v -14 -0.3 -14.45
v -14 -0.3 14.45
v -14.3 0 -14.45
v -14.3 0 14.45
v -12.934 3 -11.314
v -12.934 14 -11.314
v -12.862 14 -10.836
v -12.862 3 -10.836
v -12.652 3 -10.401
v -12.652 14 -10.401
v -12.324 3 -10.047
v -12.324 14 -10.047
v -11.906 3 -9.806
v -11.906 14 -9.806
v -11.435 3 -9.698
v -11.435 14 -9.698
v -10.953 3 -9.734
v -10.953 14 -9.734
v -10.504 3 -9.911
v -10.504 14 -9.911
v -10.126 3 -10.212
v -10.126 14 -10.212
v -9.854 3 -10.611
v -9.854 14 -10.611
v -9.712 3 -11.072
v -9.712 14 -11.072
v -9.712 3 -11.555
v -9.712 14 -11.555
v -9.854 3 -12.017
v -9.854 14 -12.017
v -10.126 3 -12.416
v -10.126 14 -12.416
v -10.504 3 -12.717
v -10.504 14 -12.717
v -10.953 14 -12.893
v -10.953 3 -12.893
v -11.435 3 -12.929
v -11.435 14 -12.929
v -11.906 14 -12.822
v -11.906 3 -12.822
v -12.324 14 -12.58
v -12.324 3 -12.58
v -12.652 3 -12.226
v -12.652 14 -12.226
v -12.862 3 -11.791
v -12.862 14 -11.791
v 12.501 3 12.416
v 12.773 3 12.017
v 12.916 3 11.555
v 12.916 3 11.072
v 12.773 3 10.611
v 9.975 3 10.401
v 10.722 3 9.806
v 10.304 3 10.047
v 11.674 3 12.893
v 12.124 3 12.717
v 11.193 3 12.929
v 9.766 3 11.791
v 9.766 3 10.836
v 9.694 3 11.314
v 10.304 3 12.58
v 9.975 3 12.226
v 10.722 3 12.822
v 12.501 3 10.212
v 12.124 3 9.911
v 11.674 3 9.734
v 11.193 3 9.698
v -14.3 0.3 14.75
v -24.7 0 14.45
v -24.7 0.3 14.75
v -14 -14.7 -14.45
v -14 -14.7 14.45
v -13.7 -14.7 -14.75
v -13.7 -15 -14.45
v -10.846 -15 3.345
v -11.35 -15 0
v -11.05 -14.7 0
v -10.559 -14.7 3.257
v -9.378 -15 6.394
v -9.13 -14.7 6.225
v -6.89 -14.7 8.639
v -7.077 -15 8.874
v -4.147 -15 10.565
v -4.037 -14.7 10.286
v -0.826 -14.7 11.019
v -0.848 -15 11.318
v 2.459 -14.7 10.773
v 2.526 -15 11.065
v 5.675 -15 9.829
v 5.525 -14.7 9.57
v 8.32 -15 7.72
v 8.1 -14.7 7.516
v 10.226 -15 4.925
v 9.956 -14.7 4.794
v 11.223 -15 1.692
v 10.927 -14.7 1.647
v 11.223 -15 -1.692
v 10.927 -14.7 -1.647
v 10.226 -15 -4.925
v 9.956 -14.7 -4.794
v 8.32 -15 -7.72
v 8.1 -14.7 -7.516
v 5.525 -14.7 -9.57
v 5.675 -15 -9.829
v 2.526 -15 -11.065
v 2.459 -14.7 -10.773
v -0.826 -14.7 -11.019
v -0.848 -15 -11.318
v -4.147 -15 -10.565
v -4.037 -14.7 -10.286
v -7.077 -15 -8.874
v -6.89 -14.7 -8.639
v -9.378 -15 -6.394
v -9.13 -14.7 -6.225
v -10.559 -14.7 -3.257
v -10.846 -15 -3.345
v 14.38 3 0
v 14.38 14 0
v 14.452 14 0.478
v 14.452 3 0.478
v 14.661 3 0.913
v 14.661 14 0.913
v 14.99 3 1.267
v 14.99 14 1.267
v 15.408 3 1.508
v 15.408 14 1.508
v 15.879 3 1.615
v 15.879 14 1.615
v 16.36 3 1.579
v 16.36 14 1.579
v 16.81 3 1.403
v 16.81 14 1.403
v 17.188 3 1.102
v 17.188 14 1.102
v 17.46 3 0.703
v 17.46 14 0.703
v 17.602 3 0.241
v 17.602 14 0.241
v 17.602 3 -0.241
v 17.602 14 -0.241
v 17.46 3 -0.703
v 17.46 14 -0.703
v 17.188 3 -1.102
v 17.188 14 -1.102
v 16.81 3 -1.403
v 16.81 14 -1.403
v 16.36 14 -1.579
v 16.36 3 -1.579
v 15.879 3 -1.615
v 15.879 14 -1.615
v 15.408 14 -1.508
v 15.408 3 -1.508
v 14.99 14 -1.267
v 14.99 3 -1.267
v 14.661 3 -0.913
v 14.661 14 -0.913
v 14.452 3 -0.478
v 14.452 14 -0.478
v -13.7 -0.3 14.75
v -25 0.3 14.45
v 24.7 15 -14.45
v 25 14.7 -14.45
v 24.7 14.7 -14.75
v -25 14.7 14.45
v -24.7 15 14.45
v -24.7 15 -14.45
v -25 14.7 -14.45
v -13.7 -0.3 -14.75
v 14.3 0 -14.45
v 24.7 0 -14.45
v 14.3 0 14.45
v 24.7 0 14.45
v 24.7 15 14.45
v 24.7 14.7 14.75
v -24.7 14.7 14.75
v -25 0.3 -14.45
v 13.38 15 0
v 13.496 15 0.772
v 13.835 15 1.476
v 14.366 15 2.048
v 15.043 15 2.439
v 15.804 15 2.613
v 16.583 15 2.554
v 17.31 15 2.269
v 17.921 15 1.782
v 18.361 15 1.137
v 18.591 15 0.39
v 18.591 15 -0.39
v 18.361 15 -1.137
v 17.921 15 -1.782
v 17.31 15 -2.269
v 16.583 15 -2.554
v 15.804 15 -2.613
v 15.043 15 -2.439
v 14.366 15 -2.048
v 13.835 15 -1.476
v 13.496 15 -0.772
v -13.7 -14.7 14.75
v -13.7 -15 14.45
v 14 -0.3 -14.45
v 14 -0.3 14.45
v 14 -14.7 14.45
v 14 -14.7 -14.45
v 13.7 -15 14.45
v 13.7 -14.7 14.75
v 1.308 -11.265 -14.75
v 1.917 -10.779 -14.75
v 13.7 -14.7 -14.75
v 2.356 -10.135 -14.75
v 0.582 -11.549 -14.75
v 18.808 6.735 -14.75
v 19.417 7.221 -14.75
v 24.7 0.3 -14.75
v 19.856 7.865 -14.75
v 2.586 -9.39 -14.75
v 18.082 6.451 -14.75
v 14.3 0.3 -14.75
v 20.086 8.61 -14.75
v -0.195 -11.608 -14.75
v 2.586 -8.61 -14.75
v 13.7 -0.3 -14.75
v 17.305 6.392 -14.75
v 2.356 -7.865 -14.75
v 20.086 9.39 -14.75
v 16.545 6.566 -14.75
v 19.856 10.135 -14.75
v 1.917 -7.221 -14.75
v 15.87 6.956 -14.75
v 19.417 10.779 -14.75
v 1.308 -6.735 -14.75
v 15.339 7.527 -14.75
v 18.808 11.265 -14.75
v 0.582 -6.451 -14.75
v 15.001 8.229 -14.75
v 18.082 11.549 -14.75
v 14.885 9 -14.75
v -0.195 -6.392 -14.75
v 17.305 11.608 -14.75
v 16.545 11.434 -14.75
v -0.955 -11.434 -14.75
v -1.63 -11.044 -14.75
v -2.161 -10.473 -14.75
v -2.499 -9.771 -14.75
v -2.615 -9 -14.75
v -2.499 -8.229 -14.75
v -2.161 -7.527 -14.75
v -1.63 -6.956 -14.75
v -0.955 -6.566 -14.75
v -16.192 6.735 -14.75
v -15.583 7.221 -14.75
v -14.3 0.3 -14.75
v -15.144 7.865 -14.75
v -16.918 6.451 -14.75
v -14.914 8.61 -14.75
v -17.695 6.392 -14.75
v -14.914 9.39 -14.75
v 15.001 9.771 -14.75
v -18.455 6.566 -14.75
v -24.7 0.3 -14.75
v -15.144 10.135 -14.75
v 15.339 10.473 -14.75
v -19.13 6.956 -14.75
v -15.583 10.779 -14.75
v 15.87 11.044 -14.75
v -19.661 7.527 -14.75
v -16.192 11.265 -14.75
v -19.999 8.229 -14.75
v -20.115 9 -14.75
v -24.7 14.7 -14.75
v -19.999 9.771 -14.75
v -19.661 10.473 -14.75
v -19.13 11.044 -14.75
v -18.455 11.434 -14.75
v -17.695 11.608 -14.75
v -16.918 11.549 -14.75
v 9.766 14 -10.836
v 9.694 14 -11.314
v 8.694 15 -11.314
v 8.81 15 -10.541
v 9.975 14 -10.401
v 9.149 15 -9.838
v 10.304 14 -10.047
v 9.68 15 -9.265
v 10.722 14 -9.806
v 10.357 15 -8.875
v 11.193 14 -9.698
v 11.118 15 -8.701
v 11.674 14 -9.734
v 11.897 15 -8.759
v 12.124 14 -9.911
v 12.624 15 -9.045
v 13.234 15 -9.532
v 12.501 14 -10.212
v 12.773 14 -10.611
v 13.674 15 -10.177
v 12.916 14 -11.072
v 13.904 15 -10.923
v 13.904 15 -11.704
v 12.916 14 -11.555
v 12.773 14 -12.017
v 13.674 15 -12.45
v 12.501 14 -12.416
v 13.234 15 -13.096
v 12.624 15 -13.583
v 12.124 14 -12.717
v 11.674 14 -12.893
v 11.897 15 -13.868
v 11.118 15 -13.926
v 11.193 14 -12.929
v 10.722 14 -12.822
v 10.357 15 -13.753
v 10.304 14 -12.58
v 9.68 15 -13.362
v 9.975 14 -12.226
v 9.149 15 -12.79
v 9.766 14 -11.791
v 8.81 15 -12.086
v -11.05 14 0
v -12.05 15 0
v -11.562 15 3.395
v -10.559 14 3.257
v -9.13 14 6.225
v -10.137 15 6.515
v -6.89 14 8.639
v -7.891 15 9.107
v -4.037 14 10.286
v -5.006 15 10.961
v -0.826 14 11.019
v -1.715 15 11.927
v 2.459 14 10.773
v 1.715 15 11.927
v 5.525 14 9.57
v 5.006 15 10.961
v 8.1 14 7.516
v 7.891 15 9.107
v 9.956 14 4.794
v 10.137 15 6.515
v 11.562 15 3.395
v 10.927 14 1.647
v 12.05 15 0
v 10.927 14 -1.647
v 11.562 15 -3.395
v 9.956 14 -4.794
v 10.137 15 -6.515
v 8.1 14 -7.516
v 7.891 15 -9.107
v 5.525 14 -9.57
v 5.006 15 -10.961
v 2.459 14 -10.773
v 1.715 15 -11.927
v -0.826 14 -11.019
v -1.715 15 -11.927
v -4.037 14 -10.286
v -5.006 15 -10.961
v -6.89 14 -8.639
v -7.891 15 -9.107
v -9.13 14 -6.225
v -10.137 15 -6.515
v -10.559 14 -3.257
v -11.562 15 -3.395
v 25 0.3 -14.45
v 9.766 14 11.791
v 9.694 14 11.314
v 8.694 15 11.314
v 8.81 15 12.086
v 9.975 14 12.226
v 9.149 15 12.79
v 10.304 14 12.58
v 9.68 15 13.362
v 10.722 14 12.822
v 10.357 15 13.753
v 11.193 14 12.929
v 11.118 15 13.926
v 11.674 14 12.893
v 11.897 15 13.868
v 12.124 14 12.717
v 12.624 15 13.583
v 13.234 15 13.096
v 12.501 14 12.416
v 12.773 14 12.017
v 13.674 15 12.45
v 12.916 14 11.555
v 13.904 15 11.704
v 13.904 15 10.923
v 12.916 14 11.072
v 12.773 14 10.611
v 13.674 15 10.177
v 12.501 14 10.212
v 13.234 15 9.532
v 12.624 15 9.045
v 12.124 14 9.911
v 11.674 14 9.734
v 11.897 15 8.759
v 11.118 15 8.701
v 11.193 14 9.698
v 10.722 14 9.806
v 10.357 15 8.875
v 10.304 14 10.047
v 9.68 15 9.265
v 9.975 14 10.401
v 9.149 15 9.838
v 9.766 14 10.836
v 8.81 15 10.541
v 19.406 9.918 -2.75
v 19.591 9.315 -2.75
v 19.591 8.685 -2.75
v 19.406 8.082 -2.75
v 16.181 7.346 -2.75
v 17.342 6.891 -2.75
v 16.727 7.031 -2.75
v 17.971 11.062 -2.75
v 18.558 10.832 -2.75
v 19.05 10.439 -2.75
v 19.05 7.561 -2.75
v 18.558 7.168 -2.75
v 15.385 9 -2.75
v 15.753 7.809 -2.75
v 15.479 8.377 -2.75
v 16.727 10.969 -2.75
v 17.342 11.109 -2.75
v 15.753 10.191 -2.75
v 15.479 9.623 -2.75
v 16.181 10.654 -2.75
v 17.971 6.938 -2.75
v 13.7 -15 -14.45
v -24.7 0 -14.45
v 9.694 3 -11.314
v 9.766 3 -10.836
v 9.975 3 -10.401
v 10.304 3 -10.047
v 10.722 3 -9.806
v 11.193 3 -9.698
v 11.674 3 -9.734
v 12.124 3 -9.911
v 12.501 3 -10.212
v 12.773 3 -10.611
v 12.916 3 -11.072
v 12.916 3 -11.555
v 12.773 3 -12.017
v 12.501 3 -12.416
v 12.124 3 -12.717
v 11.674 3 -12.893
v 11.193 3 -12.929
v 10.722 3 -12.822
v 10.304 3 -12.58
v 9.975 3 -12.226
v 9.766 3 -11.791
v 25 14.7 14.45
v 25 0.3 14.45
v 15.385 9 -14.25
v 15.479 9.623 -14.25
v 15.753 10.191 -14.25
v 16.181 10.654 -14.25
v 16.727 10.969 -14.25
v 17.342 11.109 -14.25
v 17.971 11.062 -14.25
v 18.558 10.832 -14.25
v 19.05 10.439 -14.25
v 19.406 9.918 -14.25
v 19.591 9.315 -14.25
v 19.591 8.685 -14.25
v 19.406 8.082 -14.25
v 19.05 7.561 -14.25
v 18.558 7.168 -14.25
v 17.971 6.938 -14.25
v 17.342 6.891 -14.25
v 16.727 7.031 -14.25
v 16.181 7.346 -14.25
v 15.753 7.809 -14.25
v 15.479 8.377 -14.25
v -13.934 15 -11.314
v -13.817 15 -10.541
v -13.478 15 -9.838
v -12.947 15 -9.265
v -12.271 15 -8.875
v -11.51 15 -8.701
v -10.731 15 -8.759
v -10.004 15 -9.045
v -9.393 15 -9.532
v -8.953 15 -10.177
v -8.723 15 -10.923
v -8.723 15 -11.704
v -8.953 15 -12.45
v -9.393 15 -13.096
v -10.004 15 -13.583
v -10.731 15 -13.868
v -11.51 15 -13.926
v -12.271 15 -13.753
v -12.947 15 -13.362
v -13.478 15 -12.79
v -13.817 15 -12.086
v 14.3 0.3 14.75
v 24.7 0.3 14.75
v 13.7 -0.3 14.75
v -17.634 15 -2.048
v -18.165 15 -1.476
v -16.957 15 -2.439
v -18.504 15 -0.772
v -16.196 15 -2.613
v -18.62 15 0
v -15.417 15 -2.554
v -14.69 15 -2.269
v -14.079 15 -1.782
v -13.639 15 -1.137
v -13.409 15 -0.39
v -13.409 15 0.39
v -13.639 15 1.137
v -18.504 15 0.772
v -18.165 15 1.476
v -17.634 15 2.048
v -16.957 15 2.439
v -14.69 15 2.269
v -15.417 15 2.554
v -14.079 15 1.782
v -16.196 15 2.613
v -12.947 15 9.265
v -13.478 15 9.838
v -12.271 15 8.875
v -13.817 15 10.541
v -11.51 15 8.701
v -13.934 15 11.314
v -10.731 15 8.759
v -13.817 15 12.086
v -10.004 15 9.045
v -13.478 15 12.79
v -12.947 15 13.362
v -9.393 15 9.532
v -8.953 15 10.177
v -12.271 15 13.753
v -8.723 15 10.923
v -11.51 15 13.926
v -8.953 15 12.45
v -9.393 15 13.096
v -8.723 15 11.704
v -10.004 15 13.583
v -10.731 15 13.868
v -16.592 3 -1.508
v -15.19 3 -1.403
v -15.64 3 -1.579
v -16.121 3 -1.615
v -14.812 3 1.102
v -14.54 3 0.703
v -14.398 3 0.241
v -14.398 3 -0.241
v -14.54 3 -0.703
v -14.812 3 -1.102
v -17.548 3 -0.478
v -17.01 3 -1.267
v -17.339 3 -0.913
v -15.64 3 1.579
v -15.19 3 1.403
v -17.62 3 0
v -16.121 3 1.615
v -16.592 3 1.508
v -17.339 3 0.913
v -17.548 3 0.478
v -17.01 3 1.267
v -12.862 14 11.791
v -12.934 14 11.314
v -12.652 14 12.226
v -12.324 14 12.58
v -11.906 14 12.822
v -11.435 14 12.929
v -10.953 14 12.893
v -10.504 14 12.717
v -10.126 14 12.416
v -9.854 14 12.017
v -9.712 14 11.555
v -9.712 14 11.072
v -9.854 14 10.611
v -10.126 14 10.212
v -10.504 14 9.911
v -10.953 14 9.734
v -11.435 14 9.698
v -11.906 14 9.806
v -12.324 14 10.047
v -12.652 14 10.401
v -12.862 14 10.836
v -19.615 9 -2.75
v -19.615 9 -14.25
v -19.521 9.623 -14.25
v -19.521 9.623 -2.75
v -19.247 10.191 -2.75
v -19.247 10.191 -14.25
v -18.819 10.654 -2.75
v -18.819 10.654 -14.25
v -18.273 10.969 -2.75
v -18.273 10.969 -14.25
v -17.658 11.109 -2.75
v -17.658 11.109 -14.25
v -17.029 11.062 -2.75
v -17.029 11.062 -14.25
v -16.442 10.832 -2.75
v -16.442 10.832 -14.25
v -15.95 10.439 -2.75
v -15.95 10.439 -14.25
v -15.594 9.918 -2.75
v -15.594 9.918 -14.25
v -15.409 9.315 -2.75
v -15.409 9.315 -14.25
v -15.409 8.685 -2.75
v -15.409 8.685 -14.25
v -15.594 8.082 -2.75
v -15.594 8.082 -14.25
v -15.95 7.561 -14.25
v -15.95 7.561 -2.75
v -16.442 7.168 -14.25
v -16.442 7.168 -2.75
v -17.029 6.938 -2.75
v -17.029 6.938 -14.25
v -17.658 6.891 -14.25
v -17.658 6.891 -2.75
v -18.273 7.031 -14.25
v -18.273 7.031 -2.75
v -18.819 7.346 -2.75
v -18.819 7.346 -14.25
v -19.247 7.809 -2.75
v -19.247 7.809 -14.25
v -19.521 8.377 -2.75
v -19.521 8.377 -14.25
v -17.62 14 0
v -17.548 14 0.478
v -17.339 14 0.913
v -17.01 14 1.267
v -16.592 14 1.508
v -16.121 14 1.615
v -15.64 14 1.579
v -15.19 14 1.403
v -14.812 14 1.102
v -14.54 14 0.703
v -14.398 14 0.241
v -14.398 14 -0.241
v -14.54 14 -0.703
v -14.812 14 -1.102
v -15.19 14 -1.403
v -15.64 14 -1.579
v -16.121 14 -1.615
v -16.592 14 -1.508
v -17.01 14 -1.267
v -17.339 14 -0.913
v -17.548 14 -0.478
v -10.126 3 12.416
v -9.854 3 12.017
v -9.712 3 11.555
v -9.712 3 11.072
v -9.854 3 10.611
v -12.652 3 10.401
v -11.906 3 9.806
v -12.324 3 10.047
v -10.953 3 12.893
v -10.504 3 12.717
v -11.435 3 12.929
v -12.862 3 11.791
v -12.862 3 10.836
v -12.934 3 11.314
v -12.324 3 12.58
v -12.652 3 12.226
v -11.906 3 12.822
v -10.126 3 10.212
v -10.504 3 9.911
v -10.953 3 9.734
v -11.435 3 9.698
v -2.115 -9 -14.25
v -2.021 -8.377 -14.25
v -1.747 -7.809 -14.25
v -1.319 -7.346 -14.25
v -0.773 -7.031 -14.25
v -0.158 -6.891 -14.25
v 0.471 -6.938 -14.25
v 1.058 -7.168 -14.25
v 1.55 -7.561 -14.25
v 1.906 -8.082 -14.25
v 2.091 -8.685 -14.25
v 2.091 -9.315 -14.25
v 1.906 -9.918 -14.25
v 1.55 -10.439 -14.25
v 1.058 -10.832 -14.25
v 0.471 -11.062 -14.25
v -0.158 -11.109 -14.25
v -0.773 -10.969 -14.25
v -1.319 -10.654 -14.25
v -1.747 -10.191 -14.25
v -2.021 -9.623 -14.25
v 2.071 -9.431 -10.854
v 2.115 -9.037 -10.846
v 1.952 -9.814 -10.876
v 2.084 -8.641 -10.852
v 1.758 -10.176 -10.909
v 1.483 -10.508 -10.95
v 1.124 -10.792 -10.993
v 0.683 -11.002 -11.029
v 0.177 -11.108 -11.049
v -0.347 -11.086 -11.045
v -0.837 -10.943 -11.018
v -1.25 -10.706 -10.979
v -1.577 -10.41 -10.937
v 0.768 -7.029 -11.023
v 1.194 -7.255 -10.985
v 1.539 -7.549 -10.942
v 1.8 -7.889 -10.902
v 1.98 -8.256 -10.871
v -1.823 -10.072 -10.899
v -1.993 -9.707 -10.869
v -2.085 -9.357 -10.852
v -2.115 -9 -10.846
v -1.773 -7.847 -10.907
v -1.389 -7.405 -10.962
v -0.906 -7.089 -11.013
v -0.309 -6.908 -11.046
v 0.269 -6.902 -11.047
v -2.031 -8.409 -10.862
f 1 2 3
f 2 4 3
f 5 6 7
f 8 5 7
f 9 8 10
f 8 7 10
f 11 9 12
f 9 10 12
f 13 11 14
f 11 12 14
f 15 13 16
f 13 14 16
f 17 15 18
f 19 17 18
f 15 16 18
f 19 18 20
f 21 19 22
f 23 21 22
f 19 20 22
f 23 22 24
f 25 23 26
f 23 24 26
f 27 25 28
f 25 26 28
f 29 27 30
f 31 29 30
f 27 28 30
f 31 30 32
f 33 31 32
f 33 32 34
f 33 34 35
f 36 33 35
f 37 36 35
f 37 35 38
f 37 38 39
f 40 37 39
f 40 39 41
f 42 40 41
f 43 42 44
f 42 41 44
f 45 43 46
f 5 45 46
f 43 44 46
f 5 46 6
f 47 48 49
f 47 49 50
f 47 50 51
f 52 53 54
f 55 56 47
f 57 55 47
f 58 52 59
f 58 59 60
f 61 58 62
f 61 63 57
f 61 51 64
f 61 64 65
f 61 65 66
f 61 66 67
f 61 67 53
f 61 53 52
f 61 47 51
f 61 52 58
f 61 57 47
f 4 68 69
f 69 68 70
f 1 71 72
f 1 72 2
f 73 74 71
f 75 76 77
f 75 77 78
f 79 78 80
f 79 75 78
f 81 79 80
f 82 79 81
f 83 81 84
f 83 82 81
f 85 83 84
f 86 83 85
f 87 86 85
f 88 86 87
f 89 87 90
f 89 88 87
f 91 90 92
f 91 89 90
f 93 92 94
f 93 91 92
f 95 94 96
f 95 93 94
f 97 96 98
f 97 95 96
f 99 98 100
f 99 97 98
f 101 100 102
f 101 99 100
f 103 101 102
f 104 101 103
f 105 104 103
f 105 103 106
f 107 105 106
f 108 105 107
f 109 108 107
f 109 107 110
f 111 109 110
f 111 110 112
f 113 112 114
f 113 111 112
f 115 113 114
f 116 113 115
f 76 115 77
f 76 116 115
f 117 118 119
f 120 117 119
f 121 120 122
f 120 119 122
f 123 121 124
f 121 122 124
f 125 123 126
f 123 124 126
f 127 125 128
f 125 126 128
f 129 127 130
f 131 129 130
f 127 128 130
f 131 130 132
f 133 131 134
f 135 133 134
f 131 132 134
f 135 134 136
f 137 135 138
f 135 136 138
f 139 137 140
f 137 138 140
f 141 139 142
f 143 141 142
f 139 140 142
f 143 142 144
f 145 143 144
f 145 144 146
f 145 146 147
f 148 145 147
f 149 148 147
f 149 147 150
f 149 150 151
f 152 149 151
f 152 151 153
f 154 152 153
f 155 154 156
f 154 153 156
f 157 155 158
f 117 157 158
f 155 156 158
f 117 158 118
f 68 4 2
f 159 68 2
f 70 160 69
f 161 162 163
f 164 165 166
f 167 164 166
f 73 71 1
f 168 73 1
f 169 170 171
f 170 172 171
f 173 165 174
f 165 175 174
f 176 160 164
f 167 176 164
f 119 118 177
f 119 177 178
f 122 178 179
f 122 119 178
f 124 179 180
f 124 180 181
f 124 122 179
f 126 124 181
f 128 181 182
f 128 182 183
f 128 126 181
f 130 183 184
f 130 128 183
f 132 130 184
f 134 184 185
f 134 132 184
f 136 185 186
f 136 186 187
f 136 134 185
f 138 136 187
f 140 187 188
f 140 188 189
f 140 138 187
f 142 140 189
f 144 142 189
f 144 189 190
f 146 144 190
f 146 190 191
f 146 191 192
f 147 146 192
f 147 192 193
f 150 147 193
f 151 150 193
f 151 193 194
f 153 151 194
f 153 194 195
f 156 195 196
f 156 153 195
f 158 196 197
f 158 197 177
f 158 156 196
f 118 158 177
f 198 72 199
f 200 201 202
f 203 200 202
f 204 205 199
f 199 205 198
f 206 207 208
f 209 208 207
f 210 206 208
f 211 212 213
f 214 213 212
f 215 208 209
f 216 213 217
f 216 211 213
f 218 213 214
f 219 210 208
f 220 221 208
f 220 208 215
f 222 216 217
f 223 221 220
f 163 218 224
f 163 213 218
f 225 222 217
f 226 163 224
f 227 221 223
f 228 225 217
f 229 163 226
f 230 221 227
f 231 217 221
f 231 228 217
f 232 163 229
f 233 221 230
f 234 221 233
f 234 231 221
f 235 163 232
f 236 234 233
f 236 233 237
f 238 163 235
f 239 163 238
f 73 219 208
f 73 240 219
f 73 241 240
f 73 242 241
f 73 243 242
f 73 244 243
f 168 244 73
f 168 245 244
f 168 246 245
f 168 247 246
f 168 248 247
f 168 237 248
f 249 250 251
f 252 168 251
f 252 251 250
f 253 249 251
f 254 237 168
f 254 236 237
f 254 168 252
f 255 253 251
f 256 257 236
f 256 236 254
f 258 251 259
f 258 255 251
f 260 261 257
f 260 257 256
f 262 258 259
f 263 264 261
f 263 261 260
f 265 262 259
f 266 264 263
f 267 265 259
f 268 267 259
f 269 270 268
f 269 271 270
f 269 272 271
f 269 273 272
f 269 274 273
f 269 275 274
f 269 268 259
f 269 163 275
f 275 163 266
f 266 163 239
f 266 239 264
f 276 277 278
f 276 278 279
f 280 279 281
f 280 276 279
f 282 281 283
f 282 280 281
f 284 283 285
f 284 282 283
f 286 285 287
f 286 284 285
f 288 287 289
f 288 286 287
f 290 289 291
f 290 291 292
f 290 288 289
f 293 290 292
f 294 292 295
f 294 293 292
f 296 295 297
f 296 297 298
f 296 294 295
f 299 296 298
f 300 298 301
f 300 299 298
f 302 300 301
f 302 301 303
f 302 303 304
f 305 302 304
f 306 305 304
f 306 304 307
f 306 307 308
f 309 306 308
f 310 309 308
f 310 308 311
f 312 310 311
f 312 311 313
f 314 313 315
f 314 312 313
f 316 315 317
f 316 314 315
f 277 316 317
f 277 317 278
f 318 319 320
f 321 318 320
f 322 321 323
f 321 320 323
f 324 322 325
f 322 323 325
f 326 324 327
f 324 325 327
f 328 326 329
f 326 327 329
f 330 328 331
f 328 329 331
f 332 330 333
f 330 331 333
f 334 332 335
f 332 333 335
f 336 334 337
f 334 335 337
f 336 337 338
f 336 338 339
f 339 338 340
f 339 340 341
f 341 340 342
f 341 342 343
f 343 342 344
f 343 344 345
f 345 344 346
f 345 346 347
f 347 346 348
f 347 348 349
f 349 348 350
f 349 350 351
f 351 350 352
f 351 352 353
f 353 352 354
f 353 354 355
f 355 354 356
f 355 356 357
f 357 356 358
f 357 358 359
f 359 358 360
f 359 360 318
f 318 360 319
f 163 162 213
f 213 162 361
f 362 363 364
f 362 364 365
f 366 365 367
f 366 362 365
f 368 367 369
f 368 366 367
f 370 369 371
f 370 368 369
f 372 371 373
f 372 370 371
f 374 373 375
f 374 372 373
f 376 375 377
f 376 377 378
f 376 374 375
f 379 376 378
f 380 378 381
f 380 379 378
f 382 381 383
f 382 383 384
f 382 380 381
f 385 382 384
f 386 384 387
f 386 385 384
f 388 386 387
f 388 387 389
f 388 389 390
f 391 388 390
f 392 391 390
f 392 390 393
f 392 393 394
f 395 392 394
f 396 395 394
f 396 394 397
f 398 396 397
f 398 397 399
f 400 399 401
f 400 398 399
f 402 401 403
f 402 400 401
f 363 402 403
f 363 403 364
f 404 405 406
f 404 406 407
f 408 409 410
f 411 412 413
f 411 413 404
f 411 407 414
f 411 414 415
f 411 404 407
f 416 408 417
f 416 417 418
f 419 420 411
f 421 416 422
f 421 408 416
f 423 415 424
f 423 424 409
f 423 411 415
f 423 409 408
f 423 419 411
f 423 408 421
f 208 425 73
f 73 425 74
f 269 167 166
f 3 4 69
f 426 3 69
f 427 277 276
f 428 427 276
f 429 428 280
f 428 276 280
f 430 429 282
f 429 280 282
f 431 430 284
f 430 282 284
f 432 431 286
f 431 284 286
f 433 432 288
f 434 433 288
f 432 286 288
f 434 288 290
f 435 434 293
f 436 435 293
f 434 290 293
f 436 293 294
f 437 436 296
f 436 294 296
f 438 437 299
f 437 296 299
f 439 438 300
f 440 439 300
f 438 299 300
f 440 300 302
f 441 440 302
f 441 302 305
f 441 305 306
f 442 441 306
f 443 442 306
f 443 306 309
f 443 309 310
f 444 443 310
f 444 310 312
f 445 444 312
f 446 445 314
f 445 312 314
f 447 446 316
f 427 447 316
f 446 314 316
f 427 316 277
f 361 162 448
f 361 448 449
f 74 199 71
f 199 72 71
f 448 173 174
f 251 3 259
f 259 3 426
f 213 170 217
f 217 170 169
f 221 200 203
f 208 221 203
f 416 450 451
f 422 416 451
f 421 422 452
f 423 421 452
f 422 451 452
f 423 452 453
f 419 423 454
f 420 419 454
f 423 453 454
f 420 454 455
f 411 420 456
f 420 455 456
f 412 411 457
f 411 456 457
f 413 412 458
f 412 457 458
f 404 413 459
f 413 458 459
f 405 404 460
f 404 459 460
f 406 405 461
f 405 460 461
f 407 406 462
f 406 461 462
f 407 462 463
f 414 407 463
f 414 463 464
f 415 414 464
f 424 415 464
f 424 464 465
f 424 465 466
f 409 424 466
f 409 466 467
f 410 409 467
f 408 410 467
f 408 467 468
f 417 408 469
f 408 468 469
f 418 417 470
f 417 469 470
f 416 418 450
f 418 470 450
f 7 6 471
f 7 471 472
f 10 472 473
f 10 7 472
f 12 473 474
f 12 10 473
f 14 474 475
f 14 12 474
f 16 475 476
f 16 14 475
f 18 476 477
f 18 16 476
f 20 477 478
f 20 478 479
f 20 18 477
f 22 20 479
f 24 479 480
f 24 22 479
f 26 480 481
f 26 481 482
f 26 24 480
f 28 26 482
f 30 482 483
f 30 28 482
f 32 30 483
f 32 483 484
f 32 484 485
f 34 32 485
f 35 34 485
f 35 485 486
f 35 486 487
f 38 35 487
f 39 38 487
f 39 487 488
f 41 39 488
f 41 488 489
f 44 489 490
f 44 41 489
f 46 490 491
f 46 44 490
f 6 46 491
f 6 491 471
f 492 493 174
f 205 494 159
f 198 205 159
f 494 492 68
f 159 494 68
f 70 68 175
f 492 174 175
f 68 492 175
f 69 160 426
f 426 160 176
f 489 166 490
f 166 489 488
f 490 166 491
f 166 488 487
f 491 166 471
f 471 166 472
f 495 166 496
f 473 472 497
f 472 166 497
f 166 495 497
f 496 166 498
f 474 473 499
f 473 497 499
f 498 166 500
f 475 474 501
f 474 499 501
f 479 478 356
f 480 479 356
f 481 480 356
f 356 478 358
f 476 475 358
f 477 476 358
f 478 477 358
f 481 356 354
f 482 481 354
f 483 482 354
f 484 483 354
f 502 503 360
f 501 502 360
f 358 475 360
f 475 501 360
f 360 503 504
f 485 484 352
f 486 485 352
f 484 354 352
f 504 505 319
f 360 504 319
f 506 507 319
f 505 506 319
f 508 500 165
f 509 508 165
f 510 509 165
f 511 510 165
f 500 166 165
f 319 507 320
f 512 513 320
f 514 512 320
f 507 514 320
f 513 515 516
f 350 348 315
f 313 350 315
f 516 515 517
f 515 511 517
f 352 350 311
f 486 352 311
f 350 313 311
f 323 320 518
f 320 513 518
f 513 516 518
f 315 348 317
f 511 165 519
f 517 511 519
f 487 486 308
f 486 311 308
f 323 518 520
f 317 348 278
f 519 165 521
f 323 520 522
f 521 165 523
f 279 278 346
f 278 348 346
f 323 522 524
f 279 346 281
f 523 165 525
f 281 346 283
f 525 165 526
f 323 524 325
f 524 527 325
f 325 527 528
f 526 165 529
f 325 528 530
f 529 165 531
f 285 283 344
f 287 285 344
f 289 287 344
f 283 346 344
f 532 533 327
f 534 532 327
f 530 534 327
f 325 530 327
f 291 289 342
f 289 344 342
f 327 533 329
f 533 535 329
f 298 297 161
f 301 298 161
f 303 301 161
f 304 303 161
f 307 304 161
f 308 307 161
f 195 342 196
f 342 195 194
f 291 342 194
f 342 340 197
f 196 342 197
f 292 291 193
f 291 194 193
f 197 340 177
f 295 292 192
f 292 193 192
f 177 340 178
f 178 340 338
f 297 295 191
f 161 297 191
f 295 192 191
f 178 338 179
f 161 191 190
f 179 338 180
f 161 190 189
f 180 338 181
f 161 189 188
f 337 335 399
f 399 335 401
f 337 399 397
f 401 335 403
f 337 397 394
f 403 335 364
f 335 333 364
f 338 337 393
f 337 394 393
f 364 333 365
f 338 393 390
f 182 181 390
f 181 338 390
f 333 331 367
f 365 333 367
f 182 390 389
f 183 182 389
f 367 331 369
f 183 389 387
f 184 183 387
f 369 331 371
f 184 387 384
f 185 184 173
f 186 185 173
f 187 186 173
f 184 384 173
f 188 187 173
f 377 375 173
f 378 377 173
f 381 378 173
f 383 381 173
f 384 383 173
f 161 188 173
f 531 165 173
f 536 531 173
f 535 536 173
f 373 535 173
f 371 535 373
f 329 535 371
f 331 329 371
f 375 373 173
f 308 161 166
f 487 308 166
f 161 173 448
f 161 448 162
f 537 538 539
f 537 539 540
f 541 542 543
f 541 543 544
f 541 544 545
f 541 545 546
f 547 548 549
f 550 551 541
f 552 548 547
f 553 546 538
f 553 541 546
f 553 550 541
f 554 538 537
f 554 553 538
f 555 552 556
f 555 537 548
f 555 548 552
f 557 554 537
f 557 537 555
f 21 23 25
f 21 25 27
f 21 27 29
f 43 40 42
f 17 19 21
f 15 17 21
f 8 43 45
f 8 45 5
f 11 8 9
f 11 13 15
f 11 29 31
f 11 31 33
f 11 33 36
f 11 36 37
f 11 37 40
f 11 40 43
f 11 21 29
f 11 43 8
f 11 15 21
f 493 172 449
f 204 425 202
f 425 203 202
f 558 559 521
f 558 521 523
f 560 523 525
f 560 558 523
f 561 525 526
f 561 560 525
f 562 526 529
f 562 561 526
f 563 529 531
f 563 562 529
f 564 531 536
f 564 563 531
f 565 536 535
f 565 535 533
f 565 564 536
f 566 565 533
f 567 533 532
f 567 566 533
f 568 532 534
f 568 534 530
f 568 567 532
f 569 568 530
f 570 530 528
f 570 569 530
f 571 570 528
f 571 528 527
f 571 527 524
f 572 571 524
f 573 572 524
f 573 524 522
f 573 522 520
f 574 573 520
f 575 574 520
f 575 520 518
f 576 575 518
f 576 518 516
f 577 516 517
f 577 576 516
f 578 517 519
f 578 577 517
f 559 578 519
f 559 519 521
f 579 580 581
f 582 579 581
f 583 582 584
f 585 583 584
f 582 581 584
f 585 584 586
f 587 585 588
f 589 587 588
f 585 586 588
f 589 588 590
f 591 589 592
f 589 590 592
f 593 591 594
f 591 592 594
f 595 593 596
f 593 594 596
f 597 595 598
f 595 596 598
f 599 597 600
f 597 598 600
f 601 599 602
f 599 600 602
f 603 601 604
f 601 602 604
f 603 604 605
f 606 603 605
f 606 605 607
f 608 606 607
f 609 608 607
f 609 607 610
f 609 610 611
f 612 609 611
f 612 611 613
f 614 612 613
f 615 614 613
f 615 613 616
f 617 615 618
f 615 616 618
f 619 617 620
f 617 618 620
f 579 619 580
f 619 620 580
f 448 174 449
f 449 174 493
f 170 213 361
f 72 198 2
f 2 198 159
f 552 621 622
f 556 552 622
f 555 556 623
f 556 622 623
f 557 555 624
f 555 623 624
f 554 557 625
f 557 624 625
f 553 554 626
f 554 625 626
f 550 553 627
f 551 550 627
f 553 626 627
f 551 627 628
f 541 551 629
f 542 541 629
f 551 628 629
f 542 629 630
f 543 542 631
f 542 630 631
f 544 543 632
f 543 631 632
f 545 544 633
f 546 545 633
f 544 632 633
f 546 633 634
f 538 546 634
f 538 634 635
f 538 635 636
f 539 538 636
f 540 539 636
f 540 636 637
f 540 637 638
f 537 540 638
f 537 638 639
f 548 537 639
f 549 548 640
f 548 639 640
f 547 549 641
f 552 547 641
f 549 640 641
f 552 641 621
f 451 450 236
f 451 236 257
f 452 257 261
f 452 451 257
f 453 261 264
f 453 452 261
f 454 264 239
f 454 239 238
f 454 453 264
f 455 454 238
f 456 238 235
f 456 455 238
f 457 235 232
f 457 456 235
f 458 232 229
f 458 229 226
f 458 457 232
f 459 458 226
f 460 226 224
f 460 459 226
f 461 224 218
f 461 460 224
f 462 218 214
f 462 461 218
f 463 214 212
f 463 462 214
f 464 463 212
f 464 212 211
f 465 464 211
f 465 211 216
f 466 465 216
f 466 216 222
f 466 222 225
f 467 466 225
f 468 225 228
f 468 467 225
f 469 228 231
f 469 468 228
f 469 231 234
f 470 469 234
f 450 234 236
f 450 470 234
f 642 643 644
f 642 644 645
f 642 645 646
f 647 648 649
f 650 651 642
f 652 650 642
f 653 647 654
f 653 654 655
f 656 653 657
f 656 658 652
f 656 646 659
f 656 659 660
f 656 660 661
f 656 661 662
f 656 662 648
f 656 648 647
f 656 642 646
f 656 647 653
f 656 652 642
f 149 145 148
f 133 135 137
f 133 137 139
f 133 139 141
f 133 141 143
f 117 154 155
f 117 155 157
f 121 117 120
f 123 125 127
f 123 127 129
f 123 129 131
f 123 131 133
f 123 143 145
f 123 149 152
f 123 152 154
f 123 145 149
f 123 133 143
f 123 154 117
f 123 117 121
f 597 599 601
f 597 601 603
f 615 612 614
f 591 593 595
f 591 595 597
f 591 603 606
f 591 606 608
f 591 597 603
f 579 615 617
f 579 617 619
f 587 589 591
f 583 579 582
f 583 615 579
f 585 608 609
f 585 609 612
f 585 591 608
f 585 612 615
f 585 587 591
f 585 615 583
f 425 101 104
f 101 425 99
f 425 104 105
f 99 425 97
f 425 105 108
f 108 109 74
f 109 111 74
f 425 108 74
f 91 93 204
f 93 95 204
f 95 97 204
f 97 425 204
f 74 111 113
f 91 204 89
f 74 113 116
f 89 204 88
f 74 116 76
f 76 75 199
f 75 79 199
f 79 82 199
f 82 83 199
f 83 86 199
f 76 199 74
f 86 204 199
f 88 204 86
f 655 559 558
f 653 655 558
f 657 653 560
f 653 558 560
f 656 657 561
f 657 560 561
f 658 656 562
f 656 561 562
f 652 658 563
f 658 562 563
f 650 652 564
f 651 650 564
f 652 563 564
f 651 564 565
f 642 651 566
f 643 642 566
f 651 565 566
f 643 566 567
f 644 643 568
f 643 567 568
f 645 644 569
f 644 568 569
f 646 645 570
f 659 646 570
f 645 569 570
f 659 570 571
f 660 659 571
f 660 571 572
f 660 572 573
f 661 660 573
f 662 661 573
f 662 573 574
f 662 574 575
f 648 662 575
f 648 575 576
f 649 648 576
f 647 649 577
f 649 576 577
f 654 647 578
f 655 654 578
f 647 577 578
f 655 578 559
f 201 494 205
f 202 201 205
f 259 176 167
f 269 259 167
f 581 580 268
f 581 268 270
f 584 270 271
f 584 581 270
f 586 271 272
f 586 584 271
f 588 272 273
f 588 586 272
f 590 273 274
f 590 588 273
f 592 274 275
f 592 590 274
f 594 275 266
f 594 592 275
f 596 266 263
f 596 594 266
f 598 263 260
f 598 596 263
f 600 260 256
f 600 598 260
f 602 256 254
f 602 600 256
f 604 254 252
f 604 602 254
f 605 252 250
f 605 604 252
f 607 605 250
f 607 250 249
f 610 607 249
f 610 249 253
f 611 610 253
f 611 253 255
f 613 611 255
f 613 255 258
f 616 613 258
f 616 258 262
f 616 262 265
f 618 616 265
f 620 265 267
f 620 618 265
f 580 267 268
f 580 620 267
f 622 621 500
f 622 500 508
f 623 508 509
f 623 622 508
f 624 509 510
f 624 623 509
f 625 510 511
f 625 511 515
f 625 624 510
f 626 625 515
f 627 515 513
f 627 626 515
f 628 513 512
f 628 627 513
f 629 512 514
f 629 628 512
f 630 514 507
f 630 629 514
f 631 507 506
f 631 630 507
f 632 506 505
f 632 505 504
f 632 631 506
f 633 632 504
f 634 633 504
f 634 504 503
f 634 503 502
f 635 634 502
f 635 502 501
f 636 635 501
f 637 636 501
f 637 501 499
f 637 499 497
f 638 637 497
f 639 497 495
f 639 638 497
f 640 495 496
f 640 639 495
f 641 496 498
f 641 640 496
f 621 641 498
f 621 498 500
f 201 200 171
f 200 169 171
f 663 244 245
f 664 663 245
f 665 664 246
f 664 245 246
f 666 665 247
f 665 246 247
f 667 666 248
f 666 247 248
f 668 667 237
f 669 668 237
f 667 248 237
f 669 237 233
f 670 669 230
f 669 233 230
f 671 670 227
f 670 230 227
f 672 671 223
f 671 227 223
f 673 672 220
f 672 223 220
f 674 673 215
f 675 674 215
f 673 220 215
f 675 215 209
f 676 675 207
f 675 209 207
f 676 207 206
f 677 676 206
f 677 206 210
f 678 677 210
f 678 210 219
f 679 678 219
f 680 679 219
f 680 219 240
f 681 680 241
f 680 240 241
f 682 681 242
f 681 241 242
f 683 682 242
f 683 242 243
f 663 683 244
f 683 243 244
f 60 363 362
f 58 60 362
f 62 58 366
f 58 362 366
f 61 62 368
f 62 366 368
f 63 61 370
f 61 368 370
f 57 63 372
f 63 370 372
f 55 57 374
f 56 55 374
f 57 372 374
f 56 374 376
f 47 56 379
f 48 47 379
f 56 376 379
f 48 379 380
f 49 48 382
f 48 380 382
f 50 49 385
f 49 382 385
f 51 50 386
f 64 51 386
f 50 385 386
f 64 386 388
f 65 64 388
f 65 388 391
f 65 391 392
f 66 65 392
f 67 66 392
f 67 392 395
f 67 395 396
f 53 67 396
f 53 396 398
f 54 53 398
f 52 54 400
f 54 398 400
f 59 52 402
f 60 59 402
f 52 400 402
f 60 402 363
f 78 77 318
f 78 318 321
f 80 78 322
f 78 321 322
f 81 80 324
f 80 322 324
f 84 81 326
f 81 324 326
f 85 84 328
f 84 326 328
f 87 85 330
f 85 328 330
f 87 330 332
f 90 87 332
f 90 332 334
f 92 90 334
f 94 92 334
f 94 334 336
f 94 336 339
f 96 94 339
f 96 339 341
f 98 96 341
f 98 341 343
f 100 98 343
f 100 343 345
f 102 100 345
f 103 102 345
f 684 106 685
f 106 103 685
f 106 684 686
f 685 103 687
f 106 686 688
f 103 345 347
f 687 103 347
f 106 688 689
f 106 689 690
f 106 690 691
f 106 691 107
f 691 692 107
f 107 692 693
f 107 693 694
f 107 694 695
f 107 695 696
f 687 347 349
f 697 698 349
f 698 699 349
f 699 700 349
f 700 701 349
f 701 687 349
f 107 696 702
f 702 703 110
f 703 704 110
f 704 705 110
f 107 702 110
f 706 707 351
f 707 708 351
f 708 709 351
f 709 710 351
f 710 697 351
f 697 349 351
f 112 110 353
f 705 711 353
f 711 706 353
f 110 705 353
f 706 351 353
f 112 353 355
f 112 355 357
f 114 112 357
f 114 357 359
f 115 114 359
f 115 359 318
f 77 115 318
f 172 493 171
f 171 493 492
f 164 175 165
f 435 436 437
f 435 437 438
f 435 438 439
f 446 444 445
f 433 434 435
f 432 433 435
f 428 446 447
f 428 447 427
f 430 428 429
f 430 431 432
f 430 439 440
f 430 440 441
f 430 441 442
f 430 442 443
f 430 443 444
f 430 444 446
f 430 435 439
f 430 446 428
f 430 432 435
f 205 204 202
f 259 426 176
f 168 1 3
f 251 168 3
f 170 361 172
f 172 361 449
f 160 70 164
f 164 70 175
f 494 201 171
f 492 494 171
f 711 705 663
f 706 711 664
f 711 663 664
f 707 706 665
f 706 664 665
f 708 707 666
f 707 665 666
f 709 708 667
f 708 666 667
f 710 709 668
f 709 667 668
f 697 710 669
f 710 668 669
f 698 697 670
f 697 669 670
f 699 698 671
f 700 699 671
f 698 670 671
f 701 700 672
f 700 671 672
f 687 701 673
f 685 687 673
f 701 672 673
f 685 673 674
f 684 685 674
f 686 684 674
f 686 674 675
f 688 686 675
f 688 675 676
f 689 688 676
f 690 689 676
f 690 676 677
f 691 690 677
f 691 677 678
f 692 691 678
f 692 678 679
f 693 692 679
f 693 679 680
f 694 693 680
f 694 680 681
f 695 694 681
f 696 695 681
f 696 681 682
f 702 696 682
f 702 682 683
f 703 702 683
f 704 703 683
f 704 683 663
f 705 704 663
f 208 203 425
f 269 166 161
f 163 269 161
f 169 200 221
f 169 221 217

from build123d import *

# Parameters (mm, degrees)
BOSS_EXTRUDE1_DEPTH = 14.75
SKETCH2_R           = 11.05
CUT_EXTRUDE1_DEPTH  = 42.744011547
SKETCH4_R           = 2.115
CUT_EXTRUDE2_DEPTH  = 12
SKETCH5_R           = 1.62
CUT_EXTRUDE3_DEPTH  = 12
CHAMFER1_SIZE       = 1
CHAMFER2_SIZE       = 0.5
CHAMFER3_SIZE       = 0.3


with BuildPart() as part:
    # Sketch1 → Boss-Extrude1 (new, symmetric)
    with BuildSketch(Plane.XY):
        Polygon((14, -15), (-14, -15), (-14, 0), (-25, 0), (-25, 15), (25, 15), (25, 0), (14, 0), align=None)
    extrude(amount=BOSS_EXTRUDE1_DEPTH, both=True)

    # Sketch2 → Cut-Extrude1 (cut, through all)
    with BuildSketch(Plane(origin=(0, 15, 0), x_dir=(1, 0, 0), z_dir=(0, 1, 0))):
        with Locations(Location((0, 0, 0), (0, 0, 180))):
            Circle(SKETCH2_R)
    extrude(amount=-CUT_EXTRUDE1_DEPTH, mode=Mode.SUBTRACT)

    # Sketch4 → Cut-Extrude2 (cut)
    with BuildSketch(Plane(origin=(0, 0, -14.75), x_dir=(-1, 0, 0), z_dir=(0, 0, -1))):
        with Locations((-17.5, 9)):
            Circle(SKETCH4_R)
        with Locations((17.5, 9)):
            Circle(SKETCH4_R)
        with Locations((0, -9)):
            Circle(SKETCH4_R)
    extrude(amount=-CUT_EXTRUDE2_DEPTH, mode=Mode.SUBTRACT)

    # Sketch5 → Cut-Extrude3 (cut)
    with BuildSketch(Plane(origin=(0, 15, 0), x_dir=(1, 0, 0), z_dir=(0, 1, 0))):
        with Locations(Location((16, 0, 0), (0, 0, 180))):
            Circle(SKETCH5_R)
        with Locations(Location((11.313708499, -11.313708499, 0), (0, 0, 180))):
            Circle(SKETCH5_R)
        with Locations(Location((-11.313708499, -11.313708499, 0), (0, 0, 180))):
            Circle(SKETCH5_R)
        with Locations(Location((-16, 0, 0), (0, 0, 180))):
            Circle(SKETCH5_R)
        with Locations(Location((-11.313708499, 11.313708499, 0), (0, 0, 180))):
            Circle(SKETCH5_R)
        with Locations(Location((11.313708499, 11.313708499, 0), (0, 0, 180))):
            Circle(SKETCH5_R)
    extrude(amount=-CUT_EXTRUDE3_DEPTH, mode=Mode.SUBTRACT)

    # Chamfer1
    chamfer1_edges = [part.edges().sort_by_distance(p)[0] for p in [
        (11.05, 15, 0),
        (17.62, 15, 0),
        (12.933708499, 15, 11.313708499),
        (-9.693708499, 15, 11.313708499),
        (-14.38, 15, 0),
        (-9.693708499, 15, -11.313708499),
        (12.933708499, 15, -11.313708499),
    ]]
    chamfer(chamfer1_edges, length=CHAMFER1_SIZE)

    # Chamfer2
    chamfer2_edges = [part.edges().sort_by_distance(p)[0] for p in [
        (19.615, 9, -14.75),
        (-15.385, 9, -14.75),
        (2.115, -9, -14.75),
    ]]
    chamfer(chamfer2_edges, length=CHAMFER2_SIZE)

    # Chamfer3
    chamfer3_edges = [part.edges().sort_by_distance(p)[0] for p in [
        (0, 15, 14.75),
        (25, 7.5, -14.75),
        (19.5, 0, -14.75),
        (-25, 7.5, 14.75),
        (14, 0, 0),
        (14, -15, 0),
        (-14, -15, 0),
        (-14, 0, 0),
        (-25, 0, 0),
        (-25, 15, 0),
        (25, 15, 0),
        (25, 0, 0),
        (-19.5, 0, 14.75),
        (-14, -7.5, 14.75),
        (0, -15, 14.75),
        (11.05, -15, 0),
        (14, -7.5, 14.75),
        (19.5, 0, 14.75),
        (25, 7.5, 14.75),
        (14, -7.5, -14.75),
        (0, -15, -14.75),
        (-14, -7.5, -14.75),
        (-19.5, 0, -14.75),
        (-25, 7.5, -14.75),
        (0, 15, -14.75),
    ]]
    chamfer(chamfer3_edges, length=CHAMFER3_SIZE)


solid = part.part
